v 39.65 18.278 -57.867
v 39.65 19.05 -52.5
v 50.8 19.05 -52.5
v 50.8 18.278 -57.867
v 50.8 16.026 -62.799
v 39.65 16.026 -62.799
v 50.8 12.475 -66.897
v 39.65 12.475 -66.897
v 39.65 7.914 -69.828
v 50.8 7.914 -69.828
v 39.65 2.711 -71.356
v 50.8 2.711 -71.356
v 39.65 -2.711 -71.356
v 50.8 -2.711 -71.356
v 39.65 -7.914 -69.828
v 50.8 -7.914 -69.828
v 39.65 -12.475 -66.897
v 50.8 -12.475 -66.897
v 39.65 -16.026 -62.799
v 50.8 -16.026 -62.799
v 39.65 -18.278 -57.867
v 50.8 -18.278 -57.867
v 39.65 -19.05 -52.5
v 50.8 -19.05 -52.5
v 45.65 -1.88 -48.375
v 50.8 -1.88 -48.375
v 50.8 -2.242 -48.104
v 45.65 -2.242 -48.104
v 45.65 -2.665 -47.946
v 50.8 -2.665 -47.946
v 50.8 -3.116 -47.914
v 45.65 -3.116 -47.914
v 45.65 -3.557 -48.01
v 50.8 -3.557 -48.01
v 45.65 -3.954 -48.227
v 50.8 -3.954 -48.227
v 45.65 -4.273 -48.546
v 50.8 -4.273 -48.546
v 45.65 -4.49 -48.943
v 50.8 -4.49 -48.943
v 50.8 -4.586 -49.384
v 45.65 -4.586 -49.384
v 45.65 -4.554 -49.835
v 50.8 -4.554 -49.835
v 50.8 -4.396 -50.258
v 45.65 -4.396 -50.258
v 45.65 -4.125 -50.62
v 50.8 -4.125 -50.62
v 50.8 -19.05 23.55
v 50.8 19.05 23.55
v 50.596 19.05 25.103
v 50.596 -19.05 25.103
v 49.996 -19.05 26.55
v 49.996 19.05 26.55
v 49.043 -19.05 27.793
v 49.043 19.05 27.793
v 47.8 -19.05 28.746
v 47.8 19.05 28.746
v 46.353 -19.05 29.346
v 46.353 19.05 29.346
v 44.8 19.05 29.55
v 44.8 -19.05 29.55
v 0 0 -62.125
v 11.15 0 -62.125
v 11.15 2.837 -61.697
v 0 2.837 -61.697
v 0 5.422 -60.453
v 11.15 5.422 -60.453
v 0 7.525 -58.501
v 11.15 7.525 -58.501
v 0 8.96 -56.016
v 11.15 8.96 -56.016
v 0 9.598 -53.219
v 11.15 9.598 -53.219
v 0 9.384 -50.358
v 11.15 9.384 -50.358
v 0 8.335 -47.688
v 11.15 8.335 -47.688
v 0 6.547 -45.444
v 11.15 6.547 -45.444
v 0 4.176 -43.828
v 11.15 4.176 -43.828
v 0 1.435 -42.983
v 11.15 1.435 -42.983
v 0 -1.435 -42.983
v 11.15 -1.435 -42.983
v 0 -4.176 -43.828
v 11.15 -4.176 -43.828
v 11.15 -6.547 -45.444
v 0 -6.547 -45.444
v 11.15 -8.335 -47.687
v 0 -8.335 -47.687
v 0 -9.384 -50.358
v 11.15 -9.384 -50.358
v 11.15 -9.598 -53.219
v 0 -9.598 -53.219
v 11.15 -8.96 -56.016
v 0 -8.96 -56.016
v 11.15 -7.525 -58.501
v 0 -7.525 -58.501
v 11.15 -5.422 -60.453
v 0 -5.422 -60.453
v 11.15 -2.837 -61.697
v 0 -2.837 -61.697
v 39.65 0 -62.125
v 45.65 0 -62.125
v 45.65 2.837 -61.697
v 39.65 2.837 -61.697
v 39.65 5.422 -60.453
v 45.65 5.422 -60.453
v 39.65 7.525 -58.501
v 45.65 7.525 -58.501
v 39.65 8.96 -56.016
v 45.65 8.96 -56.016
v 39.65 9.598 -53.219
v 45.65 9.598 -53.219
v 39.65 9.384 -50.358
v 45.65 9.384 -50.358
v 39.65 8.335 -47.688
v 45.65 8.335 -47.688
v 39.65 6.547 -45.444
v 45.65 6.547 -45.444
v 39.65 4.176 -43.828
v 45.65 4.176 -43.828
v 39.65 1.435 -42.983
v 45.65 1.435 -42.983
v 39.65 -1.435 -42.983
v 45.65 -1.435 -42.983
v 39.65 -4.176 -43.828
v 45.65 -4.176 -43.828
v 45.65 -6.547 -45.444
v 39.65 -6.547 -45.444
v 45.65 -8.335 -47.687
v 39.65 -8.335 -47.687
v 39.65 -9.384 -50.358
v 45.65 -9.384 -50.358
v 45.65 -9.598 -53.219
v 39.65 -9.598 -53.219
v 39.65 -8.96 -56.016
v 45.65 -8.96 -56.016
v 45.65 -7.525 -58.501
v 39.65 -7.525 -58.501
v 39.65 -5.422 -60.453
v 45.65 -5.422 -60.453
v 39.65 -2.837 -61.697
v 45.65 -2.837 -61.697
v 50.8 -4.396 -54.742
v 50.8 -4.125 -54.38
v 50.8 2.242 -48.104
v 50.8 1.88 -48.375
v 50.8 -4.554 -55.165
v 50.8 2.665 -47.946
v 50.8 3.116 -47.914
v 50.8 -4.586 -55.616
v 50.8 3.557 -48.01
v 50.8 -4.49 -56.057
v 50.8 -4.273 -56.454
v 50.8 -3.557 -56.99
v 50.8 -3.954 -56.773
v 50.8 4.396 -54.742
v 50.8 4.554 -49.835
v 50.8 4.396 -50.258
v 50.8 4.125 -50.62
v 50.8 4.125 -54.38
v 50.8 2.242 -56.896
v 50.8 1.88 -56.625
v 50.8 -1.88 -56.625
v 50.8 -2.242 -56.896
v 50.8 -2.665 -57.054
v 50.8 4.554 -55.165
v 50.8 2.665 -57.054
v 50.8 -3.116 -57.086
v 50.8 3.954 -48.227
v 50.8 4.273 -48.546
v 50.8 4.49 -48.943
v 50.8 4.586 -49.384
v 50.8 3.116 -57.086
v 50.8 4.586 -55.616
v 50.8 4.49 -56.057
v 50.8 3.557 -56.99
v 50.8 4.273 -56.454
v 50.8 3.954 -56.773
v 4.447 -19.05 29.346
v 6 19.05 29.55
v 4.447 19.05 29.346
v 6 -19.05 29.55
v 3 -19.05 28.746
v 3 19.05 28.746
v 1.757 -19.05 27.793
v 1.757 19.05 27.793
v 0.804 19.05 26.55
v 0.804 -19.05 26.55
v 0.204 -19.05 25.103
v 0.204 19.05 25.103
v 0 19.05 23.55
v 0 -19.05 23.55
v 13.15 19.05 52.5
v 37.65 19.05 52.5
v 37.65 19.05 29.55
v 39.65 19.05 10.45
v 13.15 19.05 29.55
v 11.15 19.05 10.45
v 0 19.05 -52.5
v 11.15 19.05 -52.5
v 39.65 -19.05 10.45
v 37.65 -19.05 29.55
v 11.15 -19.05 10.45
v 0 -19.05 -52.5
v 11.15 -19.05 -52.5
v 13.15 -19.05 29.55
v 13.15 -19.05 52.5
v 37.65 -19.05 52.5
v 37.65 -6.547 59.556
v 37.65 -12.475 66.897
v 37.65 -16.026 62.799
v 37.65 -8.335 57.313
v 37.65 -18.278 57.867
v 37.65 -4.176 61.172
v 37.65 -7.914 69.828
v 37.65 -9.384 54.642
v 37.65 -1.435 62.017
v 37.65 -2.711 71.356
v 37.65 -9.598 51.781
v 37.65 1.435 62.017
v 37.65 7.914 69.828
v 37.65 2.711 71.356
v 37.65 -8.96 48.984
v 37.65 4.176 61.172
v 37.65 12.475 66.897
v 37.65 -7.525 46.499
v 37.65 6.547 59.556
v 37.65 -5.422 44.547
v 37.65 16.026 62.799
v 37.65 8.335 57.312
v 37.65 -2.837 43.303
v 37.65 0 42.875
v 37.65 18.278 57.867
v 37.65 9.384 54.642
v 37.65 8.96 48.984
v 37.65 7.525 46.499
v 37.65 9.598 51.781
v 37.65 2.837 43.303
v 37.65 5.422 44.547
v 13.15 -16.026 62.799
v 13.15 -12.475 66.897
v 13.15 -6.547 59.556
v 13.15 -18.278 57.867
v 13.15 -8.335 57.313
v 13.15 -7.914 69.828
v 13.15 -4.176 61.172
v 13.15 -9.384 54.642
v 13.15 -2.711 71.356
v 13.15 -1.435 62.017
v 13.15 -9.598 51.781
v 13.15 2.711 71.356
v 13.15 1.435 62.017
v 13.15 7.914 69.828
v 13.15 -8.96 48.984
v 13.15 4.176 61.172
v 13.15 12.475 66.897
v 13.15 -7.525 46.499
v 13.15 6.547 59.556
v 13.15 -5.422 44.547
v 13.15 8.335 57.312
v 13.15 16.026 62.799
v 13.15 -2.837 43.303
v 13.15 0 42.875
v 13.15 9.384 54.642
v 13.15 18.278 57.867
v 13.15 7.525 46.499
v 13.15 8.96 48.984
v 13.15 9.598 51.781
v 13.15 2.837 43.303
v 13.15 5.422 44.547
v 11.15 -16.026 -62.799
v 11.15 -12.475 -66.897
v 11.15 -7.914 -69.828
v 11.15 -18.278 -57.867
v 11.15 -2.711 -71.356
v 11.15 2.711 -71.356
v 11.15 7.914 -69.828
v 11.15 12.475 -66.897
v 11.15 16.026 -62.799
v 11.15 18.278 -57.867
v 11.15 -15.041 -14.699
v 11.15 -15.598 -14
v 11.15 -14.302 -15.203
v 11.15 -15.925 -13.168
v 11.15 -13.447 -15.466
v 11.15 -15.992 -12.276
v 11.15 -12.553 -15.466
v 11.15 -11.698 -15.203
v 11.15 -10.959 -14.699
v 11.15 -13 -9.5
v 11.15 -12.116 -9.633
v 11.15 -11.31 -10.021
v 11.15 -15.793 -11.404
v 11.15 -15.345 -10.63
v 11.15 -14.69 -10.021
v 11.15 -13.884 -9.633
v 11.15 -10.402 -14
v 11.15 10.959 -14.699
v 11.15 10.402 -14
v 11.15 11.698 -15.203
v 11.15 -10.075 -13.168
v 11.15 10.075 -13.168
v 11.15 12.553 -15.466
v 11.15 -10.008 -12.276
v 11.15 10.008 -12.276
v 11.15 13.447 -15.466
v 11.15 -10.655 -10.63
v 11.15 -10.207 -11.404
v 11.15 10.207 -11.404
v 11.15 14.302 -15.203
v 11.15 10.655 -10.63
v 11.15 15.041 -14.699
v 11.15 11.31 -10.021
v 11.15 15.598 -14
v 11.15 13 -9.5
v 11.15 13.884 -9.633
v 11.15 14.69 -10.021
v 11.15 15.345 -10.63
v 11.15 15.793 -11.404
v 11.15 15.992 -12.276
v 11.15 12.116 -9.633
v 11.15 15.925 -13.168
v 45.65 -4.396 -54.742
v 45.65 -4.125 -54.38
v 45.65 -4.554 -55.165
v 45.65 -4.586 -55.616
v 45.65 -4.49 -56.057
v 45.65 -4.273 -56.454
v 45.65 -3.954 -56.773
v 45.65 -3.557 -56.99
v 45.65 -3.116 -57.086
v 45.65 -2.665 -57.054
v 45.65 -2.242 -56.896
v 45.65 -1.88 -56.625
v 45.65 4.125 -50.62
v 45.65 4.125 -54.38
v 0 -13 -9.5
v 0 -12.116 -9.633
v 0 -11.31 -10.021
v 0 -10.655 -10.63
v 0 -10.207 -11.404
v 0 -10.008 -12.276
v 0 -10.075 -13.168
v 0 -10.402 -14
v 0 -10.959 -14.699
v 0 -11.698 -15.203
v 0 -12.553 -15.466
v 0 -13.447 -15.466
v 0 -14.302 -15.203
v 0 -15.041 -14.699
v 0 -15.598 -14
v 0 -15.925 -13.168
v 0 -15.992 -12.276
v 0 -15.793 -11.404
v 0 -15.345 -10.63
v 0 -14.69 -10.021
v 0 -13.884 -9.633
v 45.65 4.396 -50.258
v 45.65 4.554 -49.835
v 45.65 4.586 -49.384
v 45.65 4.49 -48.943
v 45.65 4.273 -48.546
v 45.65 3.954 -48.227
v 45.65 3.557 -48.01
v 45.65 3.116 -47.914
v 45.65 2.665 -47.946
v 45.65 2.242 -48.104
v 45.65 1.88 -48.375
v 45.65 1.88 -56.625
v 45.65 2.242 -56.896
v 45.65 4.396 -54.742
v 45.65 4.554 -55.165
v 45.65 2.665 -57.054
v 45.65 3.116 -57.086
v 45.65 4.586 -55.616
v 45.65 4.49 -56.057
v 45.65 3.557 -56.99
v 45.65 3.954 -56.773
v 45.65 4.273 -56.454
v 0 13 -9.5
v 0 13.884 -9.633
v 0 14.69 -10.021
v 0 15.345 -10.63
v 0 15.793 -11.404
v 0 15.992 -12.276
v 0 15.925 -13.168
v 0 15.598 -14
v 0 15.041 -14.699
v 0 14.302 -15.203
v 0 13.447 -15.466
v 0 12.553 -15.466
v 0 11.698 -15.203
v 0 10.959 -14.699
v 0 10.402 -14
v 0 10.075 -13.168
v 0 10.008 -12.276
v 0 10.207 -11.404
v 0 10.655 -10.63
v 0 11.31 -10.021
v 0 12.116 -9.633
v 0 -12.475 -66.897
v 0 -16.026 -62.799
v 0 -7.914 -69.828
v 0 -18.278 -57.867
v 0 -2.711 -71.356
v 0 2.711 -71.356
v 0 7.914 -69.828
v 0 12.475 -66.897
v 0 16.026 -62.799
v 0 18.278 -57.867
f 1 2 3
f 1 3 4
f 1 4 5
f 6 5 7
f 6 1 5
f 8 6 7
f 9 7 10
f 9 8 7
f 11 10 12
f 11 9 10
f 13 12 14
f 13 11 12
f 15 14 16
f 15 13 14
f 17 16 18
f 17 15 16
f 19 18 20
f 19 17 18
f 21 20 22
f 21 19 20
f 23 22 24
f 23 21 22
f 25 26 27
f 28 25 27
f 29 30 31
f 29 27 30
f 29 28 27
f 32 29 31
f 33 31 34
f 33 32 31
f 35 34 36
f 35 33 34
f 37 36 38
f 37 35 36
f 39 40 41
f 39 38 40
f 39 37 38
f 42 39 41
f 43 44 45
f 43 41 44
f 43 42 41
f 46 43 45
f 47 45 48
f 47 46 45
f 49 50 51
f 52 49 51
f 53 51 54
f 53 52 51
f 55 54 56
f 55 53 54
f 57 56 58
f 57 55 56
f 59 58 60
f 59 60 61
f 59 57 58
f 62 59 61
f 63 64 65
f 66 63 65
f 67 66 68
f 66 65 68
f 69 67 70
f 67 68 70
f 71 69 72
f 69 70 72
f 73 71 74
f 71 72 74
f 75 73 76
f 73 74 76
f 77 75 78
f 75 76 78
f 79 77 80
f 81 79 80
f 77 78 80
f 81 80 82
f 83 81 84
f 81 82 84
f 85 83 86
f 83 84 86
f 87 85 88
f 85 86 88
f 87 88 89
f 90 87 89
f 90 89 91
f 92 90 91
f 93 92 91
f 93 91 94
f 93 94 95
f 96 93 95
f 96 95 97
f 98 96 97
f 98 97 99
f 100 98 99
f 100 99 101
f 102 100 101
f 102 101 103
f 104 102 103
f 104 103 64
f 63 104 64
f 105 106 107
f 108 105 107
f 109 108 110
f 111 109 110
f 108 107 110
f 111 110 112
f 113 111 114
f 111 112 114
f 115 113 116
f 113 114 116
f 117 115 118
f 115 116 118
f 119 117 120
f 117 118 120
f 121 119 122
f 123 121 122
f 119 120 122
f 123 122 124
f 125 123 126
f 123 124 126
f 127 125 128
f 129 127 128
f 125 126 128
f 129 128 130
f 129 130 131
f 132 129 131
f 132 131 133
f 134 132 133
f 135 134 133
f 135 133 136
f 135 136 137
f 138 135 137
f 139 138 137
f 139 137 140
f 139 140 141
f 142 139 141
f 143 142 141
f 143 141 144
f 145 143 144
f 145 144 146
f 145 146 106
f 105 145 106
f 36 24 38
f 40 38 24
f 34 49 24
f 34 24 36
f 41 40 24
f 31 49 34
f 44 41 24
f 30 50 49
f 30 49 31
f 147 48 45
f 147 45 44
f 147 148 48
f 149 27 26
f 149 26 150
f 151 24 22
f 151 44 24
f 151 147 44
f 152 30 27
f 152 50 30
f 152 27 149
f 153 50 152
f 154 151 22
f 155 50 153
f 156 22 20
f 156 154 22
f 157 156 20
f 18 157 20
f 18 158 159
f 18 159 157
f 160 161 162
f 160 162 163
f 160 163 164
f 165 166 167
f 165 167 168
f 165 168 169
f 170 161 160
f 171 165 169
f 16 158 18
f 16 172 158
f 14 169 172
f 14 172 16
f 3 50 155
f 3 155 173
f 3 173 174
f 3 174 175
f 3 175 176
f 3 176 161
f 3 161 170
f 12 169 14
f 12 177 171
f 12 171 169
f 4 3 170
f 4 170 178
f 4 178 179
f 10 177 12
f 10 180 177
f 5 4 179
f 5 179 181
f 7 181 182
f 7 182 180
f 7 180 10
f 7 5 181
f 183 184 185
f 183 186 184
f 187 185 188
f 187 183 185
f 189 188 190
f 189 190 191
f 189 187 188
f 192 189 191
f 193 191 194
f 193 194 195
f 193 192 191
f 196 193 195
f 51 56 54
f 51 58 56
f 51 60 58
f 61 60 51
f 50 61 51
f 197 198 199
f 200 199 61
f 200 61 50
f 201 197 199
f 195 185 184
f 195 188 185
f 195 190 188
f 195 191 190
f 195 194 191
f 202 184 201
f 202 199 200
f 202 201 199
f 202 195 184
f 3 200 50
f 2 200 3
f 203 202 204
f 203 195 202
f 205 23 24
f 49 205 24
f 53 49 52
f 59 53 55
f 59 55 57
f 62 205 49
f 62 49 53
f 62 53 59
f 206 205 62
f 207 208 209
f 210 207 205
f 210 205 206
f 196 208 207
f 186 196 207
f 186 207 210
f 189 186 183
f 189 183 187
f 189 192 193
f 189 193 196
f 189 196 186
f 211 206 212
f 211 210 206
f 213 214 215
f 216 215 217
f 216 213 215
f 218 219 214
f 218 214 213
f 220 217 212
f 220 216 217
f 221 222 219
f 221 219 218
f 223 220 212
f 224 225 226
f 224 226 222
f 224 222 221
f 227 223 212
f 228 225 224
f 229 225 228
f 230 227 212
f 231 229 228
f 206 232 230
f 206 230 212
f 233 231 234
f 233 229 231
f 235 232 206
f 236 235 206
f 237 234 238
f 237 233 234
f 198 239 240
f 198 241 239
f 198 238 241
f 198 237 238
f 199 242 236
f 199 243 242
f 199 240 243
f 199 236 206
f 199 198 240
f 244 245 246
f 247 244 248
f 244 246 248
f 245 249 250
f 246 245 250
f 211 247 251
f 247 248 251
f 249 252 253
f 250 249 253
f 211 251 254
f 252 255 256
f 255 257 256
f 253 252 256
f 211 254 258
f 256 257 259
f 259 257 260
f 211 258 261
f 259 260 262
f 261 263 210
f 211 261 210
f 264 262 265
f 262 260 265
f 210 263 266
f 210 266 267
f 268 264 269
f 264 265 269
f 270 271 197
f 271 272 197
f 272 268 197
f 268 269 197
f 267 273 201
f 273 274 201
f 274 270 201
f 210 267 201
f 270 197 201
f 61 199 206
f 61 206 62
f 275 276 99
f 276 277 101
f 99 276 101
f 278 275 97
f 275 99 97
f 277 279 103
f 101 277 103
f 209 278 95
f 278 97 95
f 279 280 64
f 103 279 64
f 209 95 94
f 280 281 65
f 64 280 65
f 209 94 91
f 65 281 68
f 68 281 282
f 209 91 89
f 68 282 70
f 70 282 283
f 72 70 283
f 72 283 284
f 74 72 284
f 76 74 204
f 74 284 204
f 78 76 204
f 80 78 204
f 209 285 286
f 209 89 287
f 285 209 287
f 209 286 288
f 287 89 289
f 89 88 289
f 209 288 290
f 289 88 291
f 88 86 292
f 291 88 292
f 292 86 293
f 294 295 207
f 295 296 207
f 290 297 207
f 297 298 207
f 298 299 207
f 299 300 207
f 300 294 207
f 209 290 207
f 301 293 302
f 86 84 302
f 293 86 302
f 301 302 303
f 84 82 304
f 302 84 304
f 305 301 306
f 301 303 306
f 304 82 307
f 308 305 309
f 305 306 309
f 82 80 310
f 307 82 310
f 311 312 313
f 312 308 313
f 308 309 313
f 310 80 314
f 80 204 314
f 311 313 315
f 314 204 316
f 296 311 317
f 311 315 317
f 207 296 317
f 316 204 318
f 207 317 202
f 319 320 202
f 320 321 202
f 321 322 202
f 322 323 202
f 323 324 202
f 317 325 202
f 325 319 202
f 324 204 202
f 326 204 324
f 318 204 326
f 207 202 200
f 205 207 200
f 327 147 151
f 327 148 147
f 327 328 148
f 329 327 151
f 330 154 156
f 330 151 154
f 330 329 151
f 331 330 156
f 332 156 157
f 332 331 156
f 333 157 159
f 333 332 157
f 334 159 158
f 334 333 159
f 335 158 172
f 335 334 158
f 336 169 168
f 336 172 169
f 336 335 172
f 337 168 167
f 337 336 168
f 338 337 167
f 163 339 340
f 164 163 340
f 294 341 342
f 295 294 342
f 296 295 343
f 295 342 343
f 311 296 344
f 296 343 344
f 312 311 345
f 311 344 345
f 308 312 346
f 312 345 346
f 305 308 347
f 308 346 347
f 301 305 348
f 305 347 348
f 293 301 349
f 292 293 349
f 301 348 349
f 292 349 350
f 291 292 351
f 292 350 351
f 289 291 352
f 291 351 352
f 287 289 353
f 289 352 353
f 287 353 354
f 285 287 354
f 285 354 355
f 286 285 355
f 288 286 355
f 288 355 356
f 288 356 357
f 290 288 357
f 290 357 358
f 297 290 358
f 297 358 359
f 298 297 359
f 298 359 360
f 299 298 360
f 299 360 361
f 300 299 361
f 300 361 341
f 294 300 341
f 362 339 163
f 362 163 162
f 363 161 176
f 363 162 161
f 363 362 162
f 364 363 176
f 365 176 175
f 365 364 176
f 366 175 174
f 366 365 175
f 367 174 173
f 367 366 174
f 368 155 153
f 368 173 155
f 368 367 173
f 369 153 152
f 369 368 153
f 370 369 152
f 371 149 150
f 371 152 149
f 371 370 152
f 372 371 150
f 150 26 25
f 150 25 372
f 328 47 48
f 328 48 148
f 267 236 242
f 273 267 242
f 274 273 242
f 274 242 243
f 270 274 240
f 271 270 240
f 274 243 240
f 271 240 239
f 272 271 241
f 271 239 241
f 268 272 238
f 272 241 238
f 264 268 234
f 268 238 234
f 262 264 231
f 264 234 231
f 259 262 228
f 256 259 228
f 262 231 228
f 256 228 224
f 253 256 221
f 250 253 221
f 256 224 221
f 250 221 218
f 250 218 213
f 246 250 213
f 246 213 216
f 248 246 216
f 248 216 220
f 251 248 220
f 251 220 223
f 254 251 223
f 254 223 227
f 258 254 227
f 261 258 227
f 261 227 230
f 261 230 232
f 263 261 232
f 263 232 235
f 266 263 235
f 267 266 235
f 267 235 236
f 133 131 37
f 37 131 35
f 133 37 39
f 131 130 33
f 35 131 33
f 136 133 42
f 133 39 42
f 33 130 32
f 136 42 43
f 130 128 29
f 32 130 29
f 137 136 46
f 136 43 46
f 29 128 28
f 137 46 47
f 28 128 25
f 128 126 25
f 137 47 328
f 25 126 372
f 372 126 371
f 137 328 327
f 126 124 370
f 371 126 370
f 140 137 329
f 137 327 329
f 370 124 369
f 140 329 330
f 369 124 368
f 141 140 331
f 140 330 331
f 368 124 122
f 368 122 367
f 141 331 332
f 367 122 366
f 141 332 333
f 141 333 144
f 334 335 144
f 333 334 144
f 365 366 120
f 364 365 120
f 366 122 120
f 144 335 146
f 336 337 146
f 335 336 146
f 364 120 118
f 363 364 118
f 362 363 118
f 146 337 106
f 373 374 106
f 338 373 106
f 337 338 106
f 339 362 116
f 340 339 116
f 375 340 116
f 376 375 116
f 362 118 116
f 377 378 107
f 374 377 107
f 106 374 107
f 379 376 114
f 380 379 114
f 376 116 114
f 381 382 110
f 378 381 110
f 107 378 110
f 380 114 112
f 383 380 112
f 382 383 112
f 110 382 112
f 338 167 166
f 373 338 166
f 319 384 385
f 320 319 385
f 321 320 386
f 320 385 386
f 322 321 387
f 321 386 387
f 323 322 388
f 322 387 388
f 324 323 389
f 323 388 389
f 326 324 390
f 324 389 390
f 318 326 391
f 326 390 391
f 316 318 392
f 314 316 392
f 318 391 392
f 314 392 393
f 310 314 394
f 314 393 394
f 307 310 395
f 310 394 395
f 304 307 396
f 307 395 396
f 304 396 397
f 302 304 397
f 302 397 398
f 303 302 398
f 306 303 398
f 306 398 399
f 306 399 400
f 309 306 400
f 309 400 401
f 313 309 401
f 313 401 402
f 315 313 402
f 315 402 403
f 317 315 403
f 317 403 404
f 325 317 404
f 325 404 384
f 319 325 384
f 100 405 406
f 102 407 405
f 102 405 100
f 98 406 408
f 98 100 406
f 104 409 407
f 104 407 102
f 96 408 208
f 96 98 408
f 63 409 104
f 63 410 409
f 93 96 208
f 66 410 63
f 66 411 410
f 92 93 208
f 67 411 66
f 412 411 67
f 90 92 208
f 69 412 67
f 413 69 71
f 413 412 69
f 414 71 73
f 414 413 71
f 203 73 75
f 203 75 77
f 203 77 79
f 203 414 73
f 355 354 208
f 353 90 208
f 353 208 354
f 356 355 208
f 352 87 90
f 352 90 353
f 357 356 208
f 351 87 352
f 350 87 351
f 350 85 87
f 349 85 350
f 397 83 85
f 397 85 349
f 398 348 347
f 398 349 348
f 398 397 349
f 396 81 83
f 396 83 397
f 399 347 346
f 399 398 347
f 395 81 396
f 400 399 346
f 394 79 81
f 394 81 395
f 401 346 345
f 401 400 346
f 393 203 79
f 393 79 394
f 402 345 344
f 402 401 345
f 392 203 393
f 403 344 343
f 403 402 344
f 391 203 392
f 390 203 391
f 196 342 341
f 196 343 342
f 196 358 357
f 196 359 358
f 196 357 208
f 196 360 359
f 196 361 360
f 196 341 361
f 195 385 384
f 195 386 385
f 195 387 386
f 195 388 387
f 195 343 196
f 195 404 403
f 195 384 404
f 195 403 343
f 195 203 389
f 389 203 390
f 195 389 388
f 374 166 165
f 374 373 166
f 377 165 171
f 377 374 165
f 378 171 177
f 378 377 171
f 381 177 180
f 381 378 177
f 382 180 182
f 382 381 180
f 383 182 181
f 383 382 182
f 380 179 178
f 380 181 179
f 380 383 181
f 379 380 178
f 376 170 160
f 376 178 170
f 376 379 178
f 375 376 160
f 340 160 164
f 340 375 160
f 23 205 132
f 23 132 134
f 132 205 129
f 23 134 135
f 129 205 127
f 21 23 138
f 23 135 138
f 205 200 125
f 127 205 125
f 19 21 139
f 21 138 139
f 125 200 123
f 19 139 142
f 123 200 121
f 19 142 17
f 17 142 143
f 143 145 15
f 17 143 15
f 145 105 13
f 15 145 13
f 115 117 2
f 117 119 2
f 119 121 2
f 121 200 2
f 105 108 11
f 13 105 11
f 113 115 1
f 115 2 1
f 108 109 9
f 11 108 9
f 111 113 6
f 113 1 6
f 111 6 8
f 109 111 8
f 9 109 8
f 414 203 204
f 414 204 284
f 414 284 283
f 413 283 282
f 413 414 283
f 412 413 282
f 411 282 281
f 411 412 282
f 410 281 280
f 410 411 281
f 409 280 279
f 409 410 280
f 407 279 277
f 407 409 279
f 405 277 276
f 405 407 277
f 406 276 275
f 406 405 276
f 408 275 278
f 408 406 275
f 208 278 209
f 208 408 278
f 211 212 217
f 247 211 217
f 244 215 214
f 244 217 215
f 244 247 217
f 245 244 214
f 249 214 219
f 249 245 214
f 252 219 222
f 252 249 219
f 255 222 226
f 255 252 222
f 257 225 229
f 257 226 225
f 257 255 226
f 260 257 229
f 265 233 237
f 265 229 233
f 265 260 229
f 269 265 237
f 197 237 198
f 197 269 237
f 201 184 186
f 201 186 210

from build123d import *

# Parameters (mm, degrees)
BOSS_EXTRUDE1_DEPTH = 50.8
SKETCH2_W           = 28.5
SKETCH2_H           = 19.05
SKETCH2_H_2         = 62.95
SKETCH2_W_2         = 13.15
SKETCH2_H_3         = 42
CUT_EXTRUDE2_DEPTH  = 150
SKETCH8_R           = 9.625
CUT_EXTRUDE8_DEPTH  = 90.793902911
SKETCH11_R          = 9.625
SKETCH11_W          = 8.25
SKETCH11_H          = 8.25
BOSS_EXTRUDE4_DEPTH = 5.15
FILLET1_R           = 6
CUT_EXTRUDE10_START = -5.15
SKETCH14_R          = 1.5875
CUT_EXTRUDE10_DEPTH = 5.15
CUT_EXTRUDE16_REACH = 91.794
SKETCH21_R          = 3


with BuildPart() as part:
    # Sketch1 → Boss-Extrude1 (new body)
    with BuildSketch(Plane(origin=(0, 0, 0), x_dir=(0, 0, -1), z_dir=(1, 0, 0))):
        with BuildLine():
            Line((-52.5, 19.05), (52.5, 19.05))
            ThreePointArc((52.5, 19.05), (71.55, 0), (52.5, -19.05))
            Line((52.5, -19.05), (-52.5, -19.05))
            ThreePointArc((-52.5, -19.05), (-71.55, 0), (-52.5, 19.05))
        make_face()
    extrude(amount=BOSS_EXTRUDE1_DEPTH)

    # Sketch2 → Cut-Extrude2 (cut)
    with BuildSketch(Plane(origin=(0, 19.05, 0), x_dir=(1, 0, 0), z_dir=(0, 1, 0))):
        with Locations((25.4, 62.025)):
            Rectangle(SKETCH2_W, SKETCH2_H)
        with Locations((25.4, 21.025)):
            Rectangle(SKETCH2_W, SKETCH2_H_2)
        with Locations((44.225, -50.55)):
            Rectangle(SKETCH2_W_2, SKETCH2_H_3)
        with Locations((6.575, -50.55)):
            Rectangle(SKETCH2_W_2, SKETCH2_H_3)
    extrude(amount=-CUT_EXTRUDE2_DEPTH, mode=Mode.SUBTRACT)

    # Sketch8 → Cut-Extrude8 (cut, through all)
    with BuildSketch(Plane(origin=(50.8, 0, 0), x_dir=(0, 0, -1), z_dir=(1, 0, 0))):
        with Locations((-52.5, 0)):
            Circle(SKETCH8_R)
        with Locations((52.5, 0)):
            Circle(SKETCH8_R)
    extrude(amount=-CUT_EXTRUDE8_DEPTH, mode=Mode.SUBTRACT)

    # Sketch11 → Boss-Extrude4 (add)
    with BuildSketch(Plane(origin=(50.8, 0, 0), x_dir=(0, 0, -1), z_dir=(1, 0, 0))):
        with Locations((52.5, 0)):
            Circle(SKETCH11_R)
        with Locations((52.5, 0)):
            Rectangle(SKETCH11_W, SKETCH11_H, mode=Mode.SUBTRACT)
    extrude(amount=-BOSS_EXTRUDE4_DEPTH)

    # Fillet1
    fillet1_edges = [part.edges().sort_by_distance(p)[0] for p in [
        (50.8, 0, 29.55),
        (0, 0, 29.55),
    ]]
    fillet(fillet1_edges, radius=FILLET1_R)

    # Sketch14 → Cut-Extrude10 (cut)
    with BuildSketch(Plane(origin=(50.8, 0, 0), x_dir=(0, 0, -1), z_dir=(1, 0, 0)).offset(CUT_EXTRUDE10_START)):
        with Locations((49.497532015, 3.002467985)):
            Circle(SKETCH14_R)
        with Locations((55.502467985, 3.002467985)):
            Circle(SKETCH14_R)
        with Locations((55.502467985, -3.002467985)):
            Circle(SKETCH14_R)
        with Locations((49.497532015, -3.002467985)):
            Circle(SKETCH14_R)
    extrude(amount=CUT_EXTRUDE10_DEPTH, mode=Mode.SUBTRACT)

    # Sketch21 → Cut-Extrude16 (cut, up to next)
    with BuildSketch(Plane.ZY, mode=Mode.PRIVATE) as cut_extrude16_sk1:
        with Locations((-12.5, 13)):
            Circle(SKETCH21_R)
    cut_extrude16_tool1 = extrude(cut_extrude16_sk1.sketch, amount=-CUT_EXTRUDE16_REACH, mode=Mode.PRIVATE) & part.part
    # Sketch21 → Cut-Extrude16 (cut, up to next)
    with BuildSketch(Plane.ZY, mode=Mode.PRIVATE) as cut_extrude16_sk2:
        with Locations((-12.5, -13)):
            Circle(SKETCH21_R)
    cut_extrude16_tool2 = extrude(cut_extrude16_sk2.sketch, amount=-CUT_EXTRUDE16_REACH, mode=Mode.PRIVATE) & part.part
    add(cut_extrude16_tool1.solids().sort_by_distance((0, 13, -12.5))[0], mode=Mode.SUBTRACT)
    add(cut_extrude16_tool2.solids().sort_by_distance((0, -13, -12.5))[0], mode=Mode.SUBTRACT)


solid = part.part
